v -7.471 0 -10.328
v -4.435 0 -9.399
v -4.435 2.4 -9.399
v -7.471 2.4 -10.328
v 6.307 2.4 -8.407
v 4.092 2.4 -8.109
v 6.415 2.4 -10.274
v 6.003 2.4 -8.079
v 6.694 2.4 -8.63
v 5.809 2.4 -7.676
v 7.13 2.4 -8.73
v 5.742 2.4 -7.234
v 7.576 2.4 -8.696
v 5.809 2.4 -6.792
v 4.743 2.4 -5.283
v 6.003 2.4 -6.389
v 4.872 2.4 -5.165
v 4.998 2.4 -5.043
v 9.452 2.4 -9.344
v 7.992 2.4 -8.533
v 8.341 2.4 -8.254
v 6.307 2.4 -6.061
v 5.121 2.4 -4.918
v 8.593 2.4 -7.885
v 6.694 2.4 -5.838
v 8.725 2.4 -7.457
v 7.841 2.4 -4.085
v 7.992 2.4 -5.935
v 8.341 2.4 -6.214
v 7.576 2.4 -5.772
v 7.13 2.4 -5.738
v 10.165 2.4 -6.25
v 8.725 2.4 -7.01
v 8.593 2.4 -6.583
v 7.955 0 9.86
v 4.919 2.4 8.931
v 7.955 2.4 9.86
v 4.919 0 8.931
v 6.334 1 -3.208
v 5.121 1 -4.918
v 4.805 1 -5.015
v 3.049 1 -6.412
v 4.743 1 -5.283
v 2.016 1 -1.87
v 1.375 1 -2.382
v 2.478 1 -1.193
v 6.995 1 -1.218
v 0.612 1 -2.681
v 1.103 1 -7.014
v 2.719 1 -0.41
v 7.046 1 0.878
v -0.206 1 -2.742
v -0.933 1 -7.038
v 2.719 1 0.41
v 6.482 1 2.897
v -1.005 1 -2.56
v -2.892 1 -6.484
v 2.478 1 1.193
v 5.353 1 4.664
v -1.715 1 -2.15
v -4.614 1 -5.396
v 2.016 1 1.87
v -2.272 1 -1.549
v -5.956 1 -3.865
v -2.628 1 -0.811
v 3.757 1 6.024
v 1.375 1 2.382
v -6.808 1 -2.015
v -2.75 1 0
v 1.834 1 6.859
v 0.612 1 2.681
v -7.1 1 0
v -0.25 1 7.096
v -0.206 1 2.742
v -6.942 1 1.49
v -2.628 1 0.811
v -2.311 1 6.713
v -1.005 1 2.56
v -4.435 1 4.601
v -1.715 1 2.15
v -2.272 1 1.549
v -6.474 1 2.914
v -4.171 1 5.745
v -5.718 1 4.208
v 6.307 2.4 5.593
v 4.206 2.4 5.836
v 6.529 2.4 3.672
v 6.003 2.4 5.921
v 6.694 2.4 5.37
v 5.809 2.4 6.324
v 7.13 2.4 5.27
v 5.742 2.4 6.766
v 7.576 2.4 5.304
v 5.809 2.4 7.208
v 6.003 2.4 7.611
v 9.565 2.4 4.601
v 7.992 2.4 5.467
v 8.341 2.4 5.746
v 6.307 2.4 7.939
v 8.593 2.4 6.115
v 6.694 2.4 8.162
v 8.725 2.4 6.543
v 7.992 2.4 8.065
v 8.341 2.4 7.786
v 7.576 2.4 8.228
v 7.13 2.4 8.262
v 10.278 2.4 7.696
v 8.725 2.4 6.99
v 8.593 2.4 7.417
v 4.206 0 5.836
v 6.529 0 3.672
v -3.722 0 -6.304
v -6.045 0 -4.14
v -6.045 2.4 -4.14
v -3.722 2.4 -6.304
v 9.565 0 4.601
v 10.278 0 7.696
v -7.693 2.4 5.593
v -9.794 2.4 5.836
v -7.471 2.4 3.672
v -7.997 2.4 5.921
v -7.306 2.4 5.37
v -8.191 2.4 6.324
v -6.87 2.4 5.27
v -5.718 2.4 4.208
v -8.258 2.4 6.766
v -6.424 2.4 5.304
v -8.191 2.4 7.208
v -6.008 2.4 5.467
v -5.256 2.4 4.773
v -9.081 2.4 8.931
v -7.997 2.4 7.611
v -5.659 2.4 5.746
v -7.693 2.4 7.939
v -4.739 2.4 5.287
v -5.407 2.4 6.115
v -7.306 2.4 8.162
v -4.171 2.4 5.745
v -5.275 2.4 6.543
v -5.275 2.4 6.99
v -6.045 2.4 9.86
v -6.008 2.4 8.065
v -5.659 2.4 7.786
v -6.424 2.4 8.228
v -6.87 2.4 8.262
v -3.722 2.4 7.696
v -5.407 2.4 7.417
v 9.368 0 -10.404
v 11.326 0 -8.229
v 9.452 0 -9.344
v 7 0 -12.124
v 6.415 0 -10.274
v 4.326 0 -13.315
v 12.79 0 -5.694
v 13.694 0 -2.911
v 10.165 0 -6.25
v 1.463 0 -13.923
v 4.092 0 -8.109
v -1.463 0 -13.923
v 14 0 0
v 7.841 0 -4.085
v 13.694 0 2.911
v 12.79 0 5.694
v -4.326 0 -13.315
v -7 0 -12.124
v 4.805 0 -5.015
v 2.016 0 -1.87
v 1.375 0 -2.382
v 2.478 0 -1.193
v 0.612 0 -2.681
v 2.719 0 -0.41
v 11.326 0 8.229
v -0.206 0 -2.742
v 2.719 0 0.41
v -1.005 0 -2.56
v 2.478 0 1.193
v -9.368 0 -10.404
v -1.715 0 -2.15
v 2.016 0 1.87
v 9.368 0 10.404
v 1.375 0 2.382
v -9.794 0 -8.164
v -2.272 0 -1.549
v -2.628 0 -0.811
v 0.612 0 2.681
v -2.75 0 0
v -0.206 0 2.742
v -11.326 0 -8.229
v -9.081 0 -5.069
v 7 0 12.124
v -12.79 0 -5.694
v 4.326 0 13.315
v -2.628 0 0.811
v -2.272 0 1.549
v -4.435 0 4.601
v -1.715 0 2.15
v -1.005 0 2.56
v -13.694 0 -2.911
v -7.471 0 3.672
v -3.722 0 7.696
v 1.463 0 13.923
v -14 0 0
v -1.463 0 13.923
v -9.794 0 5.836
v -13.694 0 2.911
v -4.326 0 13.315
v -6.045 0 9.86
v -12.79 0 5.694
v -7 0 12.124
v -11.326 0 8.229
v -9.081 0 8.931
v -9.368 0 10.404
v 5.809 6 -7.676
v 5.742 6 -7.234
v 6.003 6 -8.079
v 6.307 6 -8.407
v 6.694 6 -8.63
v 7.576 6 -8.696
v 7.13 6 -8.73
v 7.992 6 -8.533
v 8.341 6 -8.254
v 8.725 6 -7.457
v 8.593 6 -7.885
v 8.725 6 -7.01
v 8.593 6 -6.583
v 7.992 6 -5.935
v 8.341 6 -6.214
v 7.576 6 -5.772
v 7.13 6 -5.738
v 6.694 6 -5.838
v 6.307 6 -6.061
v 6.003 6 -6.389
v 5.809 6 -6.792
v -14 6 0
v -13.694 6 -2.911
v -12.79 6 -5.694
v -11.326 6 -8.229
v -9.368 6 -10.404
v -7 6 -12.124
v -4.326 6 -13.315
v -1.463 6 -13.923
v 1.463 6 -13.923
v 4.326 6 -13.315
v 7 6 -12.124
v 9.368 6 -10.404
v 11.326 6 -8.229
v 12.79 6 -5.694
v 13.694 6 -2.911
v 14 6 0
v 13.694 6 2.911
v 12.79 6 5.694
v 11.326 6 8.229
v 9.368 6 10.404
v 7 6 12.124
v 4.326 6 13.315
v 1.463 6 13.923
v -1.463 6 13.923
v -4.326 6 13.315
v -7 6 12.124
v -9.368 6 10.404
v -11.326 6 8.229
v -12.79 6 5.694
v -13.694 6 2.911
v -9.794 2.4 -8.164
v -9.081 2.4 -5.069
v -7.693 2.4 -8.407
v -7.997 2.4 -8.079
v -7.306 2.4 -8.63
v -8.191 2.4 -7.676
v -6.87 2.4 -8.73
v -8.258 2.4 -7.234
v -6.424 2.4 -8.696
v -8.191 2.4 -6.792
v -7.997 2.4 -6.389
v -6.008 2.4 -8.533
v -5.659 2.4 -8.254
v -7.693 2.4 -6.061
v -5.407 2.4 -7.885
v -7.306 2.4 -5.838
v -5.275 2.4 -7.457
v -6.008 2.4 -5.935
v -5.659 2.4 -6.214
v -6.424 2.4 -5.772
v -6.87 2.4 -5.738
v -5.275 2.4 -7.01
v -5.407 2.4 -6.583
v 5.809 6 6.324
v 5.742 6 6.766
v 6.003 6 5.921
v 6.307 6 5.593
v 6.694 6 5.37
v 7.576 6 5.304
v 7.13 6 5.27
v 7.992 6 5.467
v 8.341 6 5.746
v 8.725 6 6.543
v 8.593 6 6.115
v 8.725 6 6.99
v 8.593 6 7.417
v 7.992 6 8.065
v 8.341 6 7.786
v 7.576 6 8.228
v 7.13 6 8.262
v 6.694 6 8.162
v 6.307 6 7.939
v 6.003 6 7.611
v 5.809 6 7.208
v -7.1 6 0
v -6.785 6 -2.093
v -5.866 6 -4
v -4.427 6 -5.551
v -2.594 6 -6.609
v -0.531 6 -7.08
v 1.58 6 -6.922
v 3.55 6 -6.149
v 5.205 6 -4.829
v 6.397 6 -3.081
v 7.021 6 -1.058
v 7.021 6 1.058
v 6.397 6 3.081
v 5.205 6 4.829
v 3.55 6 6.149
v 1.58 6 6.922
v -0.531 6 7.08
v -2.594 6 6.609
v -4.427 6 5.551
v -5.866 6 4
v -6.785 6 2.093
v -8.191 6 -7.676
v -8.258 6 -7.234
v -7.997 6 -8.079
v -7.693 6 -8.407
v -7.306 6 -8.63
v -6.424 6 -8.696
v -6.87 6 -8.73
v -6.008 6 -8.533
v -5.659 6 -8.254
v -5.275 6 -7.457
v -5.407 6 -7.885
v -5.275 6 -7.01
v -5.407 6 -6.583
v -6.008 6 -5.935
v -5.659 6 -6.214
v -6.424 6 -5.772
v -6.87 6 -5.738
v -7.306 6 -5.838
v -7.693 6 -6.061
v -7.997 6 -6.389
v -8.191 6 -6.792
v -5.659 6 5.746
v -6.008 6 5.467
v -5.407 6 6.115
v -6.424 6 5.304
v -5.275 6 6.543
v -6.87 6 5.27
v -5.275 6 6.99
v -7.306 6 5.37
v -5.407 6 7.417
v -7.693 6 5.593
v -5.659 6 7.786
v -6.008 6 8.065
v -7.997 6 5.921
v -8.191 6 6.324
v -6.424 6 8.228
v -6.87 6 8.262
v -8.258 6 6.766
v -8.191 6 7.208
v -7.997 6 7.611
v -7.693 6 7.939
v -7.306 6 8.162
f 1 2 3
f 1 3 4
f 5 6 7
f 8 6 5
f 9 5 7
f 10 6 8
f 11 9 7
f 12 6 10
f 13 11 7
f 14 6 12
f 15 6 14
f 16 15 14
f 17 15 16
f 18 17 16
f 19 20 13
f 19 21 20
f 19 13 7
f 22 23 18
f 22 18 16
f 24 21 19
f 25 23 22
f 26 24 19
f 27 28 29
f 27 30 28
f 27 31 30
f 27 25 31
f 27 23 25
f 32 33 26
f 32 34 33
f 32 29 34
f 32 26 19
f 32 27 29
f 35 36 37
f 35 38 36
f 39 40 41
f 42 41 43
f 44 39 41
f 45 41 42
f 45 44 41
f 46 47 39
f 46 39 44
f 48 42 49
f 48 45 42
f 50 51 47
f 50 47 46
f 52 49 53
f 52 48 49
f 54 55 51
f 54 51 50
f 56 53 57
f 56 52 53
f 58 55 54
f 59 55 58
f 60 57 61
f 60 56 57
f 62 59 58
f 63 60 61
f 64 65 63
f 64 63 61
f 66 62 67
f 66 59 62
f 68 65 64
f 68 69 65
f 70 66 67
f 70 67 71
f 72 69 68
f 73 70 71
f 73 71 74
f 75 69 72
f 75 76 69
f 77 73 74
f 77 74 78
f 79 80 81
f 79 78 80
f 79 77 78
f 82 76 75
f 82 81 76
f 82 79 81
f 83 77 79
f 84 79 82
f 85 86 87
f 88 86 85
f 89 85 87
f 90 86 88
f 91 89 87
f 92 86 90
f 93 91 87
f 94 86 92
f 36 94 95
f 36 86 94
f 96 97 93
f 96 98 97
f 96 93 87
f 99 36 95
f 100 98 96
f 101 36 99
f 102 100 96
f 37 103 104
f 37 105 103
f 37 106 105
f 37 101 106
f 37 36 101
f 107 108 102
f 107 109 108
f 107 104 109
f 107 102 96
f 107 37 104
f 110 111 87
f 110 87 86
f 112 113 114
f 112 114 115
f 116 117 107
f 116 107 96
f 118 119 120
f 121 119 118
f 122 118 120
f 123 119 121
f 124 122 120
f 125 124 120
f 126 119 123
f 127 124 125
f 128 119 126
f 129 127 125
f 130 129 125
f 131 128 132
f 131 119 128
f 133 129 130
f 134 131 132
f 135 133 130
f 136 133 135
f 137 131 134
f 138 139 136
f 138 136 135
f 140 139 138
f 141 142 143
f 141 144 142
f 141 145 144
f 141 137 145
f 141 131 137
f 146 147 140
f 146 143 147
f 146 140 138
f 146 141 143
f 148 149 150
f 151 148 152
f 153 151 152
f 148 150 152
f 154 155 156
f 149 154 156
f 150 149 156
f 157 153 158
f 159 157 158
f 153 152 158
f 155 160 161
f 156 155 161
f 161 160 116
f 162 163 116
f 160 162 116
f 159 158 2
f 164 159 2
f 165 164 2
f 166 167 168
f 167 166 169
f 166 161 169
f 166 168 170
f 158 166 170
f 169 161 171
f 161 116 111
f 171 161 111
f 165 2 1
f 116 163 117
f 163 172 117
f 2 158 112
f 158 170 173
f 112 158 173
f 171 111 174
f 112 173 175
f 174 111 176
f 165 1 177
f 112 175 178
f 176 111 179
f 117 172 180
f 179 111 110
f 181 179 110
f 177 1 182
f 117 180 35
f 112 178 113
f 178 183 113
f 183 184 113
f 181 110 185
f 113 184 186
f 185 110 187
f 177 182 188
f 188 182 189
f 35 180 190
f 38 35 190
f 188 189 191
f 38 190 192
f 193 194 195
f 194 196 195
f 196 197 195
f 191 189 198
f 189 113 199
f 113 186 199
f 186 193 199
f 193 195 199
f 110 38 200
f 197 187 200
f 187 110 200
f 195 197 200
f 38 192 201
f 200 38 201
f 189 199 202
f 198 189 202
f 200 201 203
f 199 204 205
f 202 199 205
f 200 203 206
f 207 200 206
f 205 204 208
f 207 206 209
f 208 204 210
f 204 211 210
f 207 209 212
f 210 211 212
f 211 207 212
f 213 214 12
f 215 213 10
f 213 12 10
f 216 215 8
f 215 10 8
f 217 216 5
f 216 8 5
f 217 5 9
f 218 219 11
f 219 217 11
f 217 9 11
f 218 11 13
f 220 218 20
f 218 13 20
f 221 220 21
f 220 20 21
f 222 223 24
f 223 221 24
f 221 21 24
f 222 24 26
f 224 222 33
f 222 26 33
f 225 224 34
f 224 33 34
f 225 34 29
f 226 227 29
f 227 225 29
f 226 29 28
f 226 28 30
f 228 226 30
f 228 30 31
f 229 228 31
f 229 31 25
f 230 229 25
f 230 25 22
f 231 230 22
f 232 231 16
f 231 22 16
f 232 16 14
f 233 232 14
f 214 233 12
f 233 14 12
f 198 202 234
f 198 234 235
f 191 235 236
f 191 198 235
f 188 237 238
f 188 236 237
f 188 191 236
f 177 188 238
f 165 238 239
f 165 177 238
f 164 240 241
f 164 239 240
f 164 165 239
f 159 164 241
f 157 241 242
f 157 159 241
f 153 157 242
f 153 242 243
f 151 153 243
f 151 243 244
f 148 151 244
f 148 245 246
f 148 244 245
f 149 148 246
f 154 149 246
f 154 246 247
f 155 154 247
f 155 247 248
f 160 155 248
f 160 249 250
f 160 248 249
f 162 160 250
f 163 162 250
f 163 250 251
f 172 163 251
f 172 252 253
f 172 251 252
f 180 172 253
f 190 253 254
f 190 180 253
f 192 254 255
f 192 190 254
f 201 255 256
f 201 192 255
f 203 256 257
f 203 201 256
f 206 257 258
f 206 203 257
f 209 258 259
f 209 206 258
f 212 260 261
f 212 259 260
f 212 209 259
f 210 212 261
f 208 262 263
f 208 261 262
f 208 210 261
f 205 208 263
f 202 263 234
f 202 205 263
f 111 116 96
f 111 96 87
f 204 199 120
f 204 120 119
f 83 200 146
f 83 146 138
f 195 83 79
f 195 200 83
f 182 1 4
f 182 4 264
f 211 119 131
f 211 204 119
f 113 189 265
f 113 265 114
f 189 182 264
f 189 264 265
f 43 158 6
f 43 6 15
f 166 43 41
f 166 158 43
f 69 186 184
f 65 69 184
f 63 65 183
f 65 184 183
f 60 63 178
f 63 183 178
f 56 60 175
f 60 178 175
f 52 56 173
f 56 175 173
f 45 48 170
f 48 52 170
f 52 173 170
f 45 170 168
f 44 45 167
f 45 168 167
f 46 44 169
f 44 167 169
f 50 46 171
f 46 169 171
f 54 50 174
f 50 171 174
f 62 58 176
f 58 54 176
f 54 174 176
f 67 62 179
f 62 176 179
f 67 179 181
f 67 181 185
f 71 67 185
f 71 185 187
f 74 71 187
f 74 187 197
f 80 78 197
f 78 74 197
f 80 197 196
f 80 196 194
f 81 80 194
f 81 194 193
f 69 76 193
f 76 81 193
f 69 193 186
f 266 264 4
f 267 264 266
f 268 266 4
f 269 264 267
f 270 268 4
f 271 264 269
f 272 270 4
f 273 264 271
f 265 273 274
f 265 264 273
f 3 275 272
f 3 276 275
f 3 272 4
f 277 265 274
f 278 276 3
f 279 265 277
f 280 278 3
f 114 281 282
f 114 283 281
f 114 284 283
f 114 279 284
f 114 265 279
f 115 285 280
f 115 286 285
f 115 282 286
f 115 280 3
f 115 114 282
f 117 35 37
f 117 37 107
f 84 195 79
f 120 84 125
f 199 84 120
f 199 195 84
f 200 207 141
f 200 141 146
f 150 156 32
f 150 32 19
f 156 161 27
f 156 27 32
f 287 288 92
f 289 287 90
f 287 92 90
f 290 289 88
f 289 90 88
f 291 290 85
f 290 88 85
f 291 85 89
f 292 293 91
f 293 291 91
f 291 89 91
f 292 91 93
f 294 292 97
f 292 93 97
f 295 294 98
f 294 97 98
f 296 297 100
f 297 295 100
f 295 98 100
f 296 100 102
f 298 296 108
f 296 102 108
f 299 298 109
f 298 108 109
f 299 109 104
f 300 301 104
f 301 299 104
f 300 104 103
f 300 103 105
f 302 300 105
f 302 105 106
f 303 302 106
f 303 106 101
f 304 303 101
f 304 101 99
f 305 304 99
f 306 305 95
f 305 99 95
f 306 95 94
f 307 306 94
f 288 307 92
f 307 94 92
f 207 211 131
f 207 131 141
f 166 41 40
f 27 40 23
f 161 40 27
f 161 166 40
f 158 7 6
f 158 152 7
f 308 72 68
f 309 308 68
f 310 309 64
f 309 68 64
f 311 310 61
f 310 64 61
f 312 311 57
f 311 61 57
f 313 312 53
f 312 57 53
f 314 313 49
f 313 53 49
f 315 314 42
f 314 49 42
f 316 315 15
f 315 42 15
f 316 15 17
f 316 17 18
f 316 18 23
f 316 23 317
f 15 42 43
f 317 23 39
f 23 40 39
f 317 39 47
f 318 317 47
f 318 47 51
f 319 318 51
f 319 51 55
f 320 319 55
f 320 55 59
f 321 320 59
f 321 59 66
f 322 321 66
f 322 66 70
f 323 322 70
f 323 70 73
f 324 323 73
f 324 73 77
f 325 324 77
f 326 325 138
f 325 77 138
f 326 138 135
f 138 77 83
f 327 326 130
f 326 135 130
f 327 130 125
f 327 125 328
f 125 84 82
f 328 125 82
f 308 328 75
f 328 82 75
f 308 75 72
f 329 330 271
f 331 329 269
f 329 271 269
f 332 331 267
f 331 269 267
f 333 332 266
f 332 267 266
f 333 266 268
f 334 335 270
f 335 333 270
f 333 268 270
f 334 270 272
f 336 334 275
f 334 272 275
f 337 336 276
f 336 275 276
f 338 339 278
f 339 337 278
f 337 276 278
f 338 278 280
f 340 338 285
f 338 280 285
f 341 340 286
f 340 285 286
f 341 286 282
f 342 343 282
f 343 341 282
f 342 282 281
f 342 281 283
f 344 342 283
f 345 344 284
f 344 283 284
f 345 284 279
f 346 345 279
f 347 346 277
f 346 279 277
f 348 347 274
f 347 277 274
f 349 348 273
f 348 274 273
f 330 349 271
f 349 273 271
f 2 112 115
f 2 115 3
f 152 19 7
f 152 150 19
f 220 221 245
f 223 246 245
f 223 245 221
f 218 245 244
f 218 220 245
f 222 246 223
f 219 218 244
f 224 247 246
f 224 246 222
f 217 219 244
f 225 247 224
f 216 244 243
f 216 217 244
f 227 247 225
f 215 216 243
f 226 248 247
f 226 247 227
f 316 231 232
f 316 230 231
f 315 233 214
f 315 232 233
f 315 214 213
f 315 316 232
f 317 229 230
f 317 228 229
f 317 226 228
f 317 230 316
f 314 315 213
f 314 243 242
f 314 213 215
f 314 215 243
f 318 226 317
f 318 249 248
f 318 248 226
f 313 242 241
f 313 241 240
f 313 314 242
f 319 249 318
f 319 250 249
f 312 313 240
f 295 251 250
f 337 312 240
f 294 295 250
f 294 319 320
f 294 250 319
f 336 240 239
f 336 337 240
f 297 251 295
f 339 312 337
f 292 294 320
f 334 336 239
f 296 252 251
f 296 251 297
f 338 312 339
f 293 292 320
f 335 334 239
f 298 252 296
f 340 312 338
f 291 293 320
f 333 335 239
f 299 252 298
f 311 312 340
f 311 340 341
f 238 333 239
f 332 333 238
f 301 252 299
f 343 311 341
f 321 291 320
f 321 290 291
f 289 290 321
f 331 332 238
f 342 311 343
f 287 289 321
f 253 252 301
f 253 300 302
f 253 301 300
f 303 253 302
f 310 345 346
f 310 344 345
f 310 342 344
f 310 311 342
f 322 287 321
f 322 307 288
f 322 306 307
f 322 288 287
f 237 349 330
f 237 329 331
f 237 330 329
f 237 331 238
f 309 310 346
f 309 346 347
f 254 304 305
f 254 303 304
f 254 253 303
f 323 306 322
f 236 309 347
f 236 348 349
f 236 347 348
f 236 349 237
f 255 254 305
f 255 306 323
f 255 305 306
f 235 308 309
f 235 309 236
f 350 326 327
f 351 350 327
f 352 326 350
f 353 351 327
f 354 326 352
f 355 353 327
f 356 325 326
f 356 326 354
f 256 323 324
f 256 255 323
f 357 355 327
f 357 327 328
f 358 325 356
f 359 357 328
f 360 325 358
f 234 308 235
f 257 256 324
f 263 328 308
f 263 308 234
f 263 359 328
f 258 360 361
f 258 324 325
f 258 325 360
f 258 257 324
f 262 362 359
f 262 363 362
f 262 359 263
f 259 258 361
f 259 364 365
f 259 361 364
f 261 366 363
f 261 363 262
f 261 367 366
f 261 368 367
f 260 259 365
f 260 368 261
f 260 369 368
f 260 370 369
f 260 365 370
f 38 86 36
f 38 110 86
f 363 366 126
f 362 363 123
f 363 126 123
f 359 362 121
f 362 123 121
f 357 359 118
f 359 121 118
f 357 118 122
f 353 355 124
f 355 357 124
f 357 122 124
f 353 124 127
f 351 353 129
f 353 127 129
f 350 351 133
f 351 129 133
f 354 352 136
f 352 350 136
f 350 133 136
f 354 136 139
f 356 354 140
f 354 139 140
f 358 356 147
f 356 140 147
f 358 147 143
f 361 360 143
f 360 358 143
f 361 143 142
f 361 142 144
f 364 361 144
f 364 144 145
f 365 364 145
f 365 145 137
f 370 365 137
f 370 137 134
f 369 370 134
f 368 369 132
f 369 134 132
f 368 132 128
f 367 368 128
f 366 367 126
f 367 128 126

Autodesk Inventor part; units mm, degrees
ref_plane "YZ Plane" through (0, 0, 0) normal (1, 0, 0) x (0, 1, 0)
ref_plane "XZ Plane" through (0, 0, 0) normal (0, 1, 0) x (-1, 0, 0)
ref_plane "XY Plane" through (0, 0, 0) normal (0, 0, 1) x (1, 0, 0)
sketch "Эскиз1" plane through (0, 0, 0) normal (0, 1, 0) x (-1, 0, 0)
  circle A0 centre (0, 0) radius 14
  circle A1 centre (0, 0) radius 7.1
  circle A2 centre (6.7581, 6.7661) radius 1.5 projected
  circle A3 centre (-7.2419, -7.2339) radius 1.5 projected
  circle A4 centre (-7.2419, 6.7661) radius 1.5 projected
  circle A5 centre (6.7581, -7.2339) radius 1.5 projected
  circle A6 centre (0, 0) radius 2.75
  dimension "d0" = 28
  dimension "d1" = 14.2
  dimension "d4" = 5.5
extrude "Выдавливание2" add sketch "Эскиз1" along normal blind 6 contours A0
extrude "Выдавливание3" add sketch "Эскиз1" along normal blind 1 contours A1
sketch "Эскиз2" plane through (0, 0, 0) normal (0, -1, 0) x (1, 0, 0)
  line L0 (-9.0814, -5.0692) -> (-6.0451, -4.1396)
  line L1 (-6.0451, -4.1396) -> (-3.7219, -6.3042)
  line L2 (-3.7219, -6.3042) -> (-4.4349, -9.3986)
  line L3 (-4.4349, -9.3986) -> (-7.4712, -10.3282)
  line L4 (-7.4712, -10.3282) -> (-9.7944, -8.1636)
  line L5 (-9.7944, -8.1636) -> (-9.0814, -5.0692)
  circle A0 centre (-6.7581, -7.2339) radius 1.5 projected
  circle A1 centre (-6.7581, 6.7661) radius 1.5 projected
  circle A2 centre (7.2419, 6.7661) radius 1.5 projected
  circle A3 centre (7.2419, -7.2339) radius 1.5 projected
  line L6 (-9.0814, 8.9308) -> (-6.0451, 9.8604)
  line L7 (-6.0451, 9.8604) -> (-3.7219, 7.6958)
  line L8 (-3.7219, 7.6958) -> (-4.4349, 4.6014)
  line L9 (-4.4349, 4.6014) -> (-7.4712, 3.6718)
  line L10 (-7.4712, 3.6718) -> (-9.7944, 5.8364)
  line L11 (-9.7944, 5.8364) -> (-9.0814, 8.9308)
  line L12 (4.9186, 8.9308) -> (7.9549, 9.8604)
  line L13 (7.9549, 9.8604) -> (10.2781, 7.6958)
  line L14 (10.2781, 7.6958) -> (9.5651, 4.6014)
  line L15 (9.5651, 4.6014) -> (6.5288, 3.6718)
  line L16 (6.5288, 3.6718) -> (4.2056, 5.8364)
  line L17 (4.2056, 5.8364) -> (4.9186, 8.9308)
  line L18 (4.8052, -5.0148) -> (7.8414, -4.0851)
  line L19 (7.8414, -4.0851) -> (10.1647, -6.2498)
  line L20 (10.1647, -6.2498) -> (9.4517, -9.3441)
  line L21 (9.4517, -9.3441) -> (6.4154, -10.2738)
  line L22 (6.4154, -10.2738) -> (4.0921, -8.1091)
  line L23 (4.0921, -8.1091) -> (4.8052, -5.0148)
  line L24 (-9.0814, -5.0692) -> (-6.0451, -4.1396)
  line L25 (-6.0451, -4.1396) -> (-3.7219, -6.3042)
  line L26 (-3.7219, -6.3042) -> (-4.4349, -9.3986)
  line L27 (-4.4349, -9.3986) -> (-7.4712, -10.3282)
  line L28 (-7.4712, -10.3282) -> (-9.7944, -8.1636)
  line L29 (-9.7944, -8.1636) -> (-9.0814, -5.0692)
  point P0 (0, 0)
  dimension "d9" = 5.5
  dimension "d12" = 5.5
  dimension "d13" = 5.5
  dimension "d14" = 5.5
  dimension "d15" = 5.5
extrude "Выдавливание4" cut sketch "Эскиз2" against normal blind 2.4 contours L0 L1 L2 L3 L4 L5 | A1 | L6 L7 L8 L9 L10 L11 | L12 L13 L14 L15 L16 L17 | L18 L19 L20 L21 L22 L23
properties part number "rhtgt; gjlibgybrf"
